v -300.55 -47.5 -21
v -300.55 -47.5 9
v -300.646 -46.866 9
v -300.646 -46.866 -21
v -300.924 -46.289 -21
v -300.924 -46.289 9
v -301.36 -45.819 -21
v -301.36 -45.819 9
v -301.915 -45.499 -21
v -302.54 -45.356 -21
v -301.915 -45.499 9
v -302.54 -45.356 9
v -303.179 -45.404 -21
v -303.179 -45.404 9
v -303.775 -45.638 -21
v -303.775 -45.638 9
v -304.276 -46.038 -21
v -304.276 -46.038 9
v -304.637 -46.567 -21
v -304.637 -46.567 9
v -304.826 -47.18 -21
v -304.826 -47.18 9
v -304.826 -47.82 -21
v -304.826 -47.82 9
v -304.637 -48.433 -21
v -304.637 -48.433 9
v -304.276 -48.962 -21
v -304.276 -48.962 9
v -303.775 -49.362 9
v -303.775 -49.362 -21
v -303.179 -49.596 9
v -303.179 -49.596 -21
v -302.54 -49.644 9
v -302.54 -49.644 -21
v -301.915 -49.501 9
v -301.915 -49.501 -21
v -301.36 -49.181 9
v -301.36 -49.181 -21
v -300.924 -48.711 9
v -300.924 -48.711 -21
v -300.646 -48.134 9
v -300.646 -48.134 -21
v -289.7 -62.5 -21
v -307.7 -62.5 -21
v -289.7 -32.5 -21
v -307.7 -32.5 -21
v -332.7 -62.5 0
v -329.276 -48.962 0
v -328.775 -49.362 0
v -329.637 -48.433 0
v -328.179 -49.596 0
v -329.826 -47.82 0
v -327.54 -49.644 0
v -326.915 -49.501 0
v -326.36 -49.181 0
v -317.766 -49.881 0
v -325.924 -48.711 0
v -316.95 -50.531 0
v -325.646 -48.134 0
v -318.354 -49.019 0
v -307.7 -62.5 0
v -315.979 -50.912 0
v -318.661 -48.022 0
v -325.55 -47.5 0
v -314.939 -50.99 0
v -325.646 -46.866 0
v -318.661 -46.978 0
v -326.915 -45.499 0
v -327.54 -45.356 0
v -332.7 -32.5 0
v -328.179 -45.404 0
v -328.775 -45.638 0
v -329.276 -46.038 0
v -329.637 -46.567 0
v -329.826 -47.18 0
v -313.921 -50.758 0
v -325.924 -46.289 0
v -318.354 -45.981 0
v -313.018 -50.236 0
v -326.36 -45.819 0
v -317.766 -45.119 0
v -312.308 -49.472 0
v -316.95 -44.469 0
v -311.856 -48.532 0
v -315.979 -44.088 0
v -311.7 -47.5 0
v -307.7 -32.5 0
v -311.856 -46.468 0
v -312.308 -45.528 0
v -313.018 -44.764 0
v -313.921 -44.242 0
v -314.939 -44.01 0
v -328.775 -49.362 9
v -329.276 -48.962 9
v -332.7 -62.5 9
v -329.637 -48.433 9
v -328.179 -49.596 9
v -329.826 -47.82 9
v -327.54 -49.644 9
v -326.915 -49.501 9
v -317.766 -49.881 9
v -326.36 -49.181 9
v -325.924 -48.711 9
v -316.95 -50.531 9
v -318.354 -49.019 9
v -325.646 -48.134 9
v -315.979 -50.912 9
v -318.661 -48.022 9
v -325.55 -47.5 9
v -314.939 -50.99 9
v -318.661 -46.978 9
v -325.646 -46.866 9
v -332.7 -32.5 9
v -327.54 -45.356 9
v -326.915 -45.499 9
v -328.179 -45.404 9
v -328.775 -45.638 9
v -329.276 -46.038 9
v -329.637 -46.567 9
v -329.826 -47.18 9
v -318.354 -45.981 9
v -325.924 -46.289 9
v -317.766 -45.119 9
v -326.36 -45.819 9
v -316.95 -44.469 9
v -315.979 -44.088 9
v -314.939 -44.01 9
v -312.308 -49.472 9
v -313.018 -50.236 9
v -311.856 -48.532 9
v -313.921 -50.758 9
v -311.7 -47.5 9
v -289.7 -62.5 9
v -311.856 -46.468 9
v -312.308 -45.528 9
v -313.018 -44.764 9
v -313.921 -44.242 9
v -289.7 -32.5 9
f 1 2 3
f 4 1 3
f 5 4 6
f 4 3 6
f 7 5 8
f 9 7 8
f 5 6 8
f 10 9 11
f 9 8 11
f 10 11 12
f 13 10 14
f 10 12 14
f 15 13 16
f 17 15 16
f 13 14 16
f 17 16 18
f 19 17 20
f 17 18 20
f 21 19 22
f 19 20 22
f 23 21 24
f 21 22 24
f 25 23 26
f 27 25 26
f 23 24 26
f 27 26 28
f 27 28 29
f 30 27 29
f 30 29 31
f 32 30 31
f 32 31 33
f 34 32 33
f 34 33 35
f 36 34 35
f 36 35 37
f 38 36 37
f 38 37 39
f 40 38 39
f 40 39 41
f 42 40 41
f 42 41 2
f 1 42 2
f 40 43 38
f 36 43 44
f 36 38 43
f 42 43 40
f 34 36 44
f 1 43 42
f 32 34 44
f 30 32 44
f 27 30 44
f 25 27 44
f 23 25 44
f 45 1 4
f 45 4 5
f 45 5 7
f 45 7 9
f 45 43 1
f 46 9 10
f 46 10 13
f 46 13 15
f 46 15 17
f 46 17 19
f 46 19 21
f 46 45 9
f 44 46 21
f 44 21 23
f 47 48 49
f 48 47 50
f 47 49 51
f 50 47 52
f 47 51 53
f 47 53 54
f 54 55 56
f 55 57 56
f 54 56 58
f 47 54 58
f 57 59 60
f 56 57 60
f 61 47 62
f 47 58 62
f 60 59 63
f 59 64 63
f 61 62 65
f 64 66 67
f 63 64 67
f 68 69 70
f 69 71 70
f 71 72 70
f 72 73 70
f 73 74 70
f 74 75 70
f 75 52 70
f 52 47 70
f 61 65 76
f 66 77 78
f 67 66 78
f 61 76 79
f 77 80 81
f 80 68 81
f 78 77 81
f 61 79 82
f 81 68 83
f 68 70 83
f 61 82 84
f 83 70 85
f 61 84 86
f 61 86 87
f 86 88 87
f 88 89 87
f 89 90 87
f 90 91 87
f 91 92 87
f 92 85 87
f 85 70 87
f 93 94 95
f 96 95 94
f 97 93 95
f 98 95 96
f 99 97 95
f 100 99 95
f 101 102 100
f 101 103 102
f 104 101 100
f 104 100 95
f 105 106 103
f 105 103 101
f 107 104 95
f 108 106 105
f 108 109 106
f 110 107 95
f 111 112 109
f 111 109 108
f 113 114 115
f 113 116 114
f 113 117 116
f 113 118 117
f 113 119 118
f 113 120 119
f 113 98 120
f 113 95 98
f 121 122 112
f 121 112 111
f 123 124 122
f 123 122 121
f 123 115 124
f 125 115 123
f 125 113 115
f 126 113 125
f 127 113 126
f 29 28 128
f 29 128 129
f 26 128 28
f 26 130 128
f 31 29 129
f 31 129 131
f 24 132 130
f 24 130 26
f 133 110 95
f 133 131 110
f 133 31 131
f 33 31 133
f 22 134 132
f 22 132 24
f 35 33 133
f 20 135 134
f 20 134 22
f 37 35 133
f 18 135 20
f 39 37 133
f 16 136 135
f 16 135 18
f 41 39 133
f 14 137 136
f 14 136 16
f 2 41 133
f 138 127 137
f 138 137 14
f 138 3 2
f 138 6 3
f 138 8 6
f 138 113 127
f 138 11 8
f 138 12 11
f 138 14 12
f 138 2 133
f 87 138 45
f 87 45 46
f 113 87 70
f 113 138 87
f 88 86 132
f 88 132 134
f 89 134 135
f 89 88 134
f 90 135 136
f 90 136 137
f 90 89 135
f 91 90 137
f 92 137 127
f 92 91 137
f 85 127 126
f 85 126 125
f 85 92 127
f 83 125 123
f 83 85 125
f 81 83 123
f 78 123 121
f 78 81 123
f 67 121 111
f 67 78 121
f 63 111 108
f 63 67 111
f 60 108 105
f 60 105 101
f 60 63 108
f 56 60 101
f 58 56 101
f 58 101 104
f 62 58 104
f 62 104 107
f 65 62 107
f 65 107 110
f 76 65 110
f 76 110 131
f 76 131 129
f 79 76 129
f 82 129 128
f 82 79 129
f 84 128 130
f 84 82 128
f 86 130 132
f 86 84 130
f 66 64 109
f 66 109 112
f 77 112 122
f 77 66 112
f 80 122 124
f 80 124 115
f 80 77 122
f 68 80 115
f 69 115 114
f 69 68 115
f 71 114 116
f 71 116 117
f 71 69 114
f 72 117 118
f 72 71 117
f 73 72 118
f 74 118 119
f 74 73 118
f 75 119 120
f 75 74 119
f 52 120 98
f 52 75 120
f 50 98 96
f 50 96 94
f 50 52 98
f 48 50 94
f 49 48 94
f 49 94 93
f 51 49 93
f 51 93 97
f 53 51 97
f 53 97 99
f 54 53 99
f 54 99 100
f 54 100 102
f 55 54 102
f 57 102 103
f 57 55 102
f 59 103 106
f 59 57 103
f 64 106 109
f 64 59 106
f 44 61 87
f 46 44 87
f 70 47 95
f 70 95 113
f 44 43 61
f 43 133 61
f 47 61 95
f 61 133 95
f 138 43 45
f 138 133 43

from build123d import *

# Parameters (mm, degrees)
SKETCH1_W           = 43
SKETCH1_H           = 30
SKETCH1_R           = 2.15
SKETCH1_R_2         = 3.5
BOSS_EXTRUDE1_DEPTH = 9
SKETCH2_W           = 18
SKETCH2_H           = 30
BOSS_EXTRUDE2_DEPTH = 21
SKETCH3_R           = 2.15
CUT_EXTRUDE1_DEPTH  = 340.846521731


with BuildPart() as part:
    # Sketch1 → Boss-Extrude1 (new body)
    with BuildSketch(Plane.XY):
        with Locations((-311.200177837, -47.5)):
            Rectangle(SKETCH1_W, SKETCH1_H)
        with Locations((-327.700177837, -47.5)):
            Circle(SKETCH1_R, mode=Mode.SUBTRACT)
        with Locations((-315.200177837, -47.5)):
            Circle(SKETCH1_R_2, mode=Mode.SUBTRACT)
    extrude(amount=BOSS_EXTRUDE1_DEPTH)

    # Sketch2 → Boss-Extrude2 (add)
    with BuildSketch(Plane(origin=(0, 0, 0), x_dir=(-1, 0, 0), z_dir=(0, 0, -1))):
        with Locations((298.700177837, -47.5)):
            Rectangle(SKETCH2_W, SKETCH2_H)
    extrude(amount=BOSS_EXTRUDE2_DEPTH)

    # Sketch3 → Cut-Extrude1 (cut, through all)
    with BuildSketch(Plane.XY.offset(9)):
        with Locations((-302.700177837, -47.5)):
            Circle(SKETCH3_R)
    extrude(amount=-CUT_EXTRUDE1_DEPTH, mode=Mode.SUBTRACT)


solid = part.part
